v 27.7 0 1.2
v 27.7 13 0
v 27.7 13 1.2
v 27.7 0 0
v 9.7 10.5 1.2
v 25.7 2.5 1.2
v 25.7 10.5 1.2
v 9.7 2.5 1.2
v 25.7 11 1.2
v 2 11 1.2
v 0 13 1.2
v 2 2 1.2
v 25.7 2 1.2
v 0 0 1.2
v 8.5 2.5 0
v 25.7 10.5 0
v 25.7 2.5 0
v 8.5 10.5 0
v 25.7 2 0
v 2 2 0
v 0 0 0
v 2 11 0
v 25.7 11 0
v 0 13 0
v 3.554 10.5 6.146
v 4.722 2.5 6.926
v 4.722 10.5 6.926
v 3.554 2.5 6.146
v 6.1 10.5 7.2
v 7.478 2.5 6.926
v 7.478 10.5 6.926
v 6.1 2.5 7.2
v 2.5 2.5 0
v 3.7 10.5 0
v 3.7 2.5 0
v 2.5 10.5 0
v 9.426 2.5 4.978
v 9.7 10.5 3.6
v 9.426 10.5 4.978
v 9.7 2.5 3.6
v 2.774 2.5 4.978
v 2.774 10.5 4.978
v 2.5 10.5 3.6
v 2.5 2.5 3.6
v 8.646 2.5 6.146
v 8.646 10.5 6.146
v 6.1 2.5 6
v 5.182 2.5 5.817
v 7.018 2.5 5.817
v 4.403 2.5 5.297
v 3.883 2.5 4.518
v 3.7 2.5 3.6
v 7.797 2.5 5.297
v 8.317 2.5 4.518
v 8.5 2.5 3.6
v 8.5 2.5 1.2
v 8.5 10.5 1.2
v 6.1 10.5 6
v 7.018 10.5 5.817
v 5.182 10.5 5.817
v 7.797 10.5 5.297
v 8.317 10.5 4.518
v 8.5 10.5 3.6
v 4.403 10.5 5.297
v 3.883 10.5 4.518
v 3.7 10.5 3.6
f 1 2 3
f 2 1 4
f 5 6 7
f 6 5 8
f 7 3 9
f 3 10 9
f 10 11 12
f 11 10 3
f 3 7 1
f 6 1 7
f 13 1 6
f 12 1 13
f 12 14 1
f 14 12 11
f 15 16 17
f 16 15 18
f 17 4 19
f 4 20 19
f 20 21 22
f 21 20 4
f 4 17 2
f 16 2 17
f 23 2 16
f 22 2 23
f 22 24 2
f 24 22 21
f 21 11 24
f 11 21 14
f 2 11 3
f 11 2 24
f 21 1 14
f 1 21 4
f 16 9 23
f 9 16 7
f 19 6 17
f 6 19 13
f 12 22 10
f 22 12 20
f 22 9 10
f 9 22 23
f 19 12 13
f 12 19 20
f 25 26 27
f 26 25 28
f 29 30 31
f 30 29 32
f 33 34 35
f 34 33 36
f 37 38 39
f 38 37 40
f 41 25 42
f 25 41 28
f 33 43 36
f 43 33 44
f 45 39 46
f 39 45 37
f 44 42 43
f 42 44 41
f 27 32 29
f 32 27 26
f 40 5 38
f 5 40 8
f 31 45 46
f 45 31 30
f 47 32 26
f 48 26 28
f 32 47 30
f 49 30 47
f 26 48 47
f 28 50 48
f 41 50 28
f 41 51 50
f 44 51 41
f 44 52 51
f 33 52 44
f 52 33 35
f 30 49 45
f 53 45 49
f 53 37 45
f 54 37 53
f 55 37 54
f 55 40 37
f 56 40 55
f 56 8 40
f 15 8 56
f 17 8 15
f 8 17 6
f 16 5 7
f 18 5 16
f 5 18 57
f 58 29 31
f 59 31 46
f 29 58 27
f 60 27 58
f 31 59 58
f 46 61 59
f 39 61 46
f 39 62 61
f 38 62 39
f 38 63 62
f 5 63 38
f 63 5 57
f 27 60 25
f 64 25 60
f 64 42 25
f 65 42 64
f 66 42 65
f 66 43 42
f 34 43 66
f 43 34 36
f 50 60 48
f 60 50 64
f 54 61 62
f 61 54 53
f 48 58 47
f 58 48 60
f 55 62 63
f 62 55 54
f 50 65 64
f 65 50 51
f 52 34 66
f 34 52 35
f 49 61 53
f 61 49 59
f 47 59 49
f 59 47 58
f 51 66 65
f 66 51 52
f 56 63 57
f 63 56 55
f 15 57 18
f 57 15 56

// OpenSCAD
//Parameters
//Diameter of cable (mm)
cablediam = 4.8;
//Length label (part right of the cable without edge, mm) 
lablength = 16;
//Width label (without edge, mm)
labwidth = 8;  
//Overall thicknes of the part (mm)
thickness = 1.2;  
//Text on label (use spaces for aligning)
labeltext = "";  
//Font, correct spelled and with capitals
textfont = "Arial Black"; 
//Text appearance, 0=raised, 1=sunk, 2 = hole 
textappear=0;   


//Modules

module rim()
{
  difference()
  {
    cube([lo,wo,th]);
    translate([wr,wr,-0.5*th])
      cube([li+sp,wi+sp*2, th*2]);
  }
}

module labelplate()
{
  translate([wr+sp+cd+th, wr+sp,0])
    cube([li-cd-th,wi, th]);  
}  

module labeltext()
{
  translate([wr+sp+cd+th*3, wr+sp+wi*(1-sf)/2,0])
    linear_extrude(height = th*1.5)
      text(labeltext, size = wi*sf, font = textfont);
}  

module chull(cdh,wih,tcb)
{
  hull()  
  {
    translate([0,0,-tcb])
      cube([cdh, wih,cdh/2]);   
    translate([cdh/2,wih/2,cdh/2])
      rotate([90,0,0])  
        cylinder(d=cdh, wih, center=true); 
  }
}  

module cablehull()
{
  translate([wr+sp,wr+sp,0])
    difference()
    {
      chull(cd+th*2, wi,0);
      translate([th,-wi/2,th])
        chull(cd,wi*2, th*2);
    }  
}  



//main
//secondary parameters

sp = 0.5;          //space between label and outerrim
wi = labwidth;     //inner length
cd = cablediam;    //cable diameter
th = thickness;    //thickness plate
wr = wi/4;         //width outer rim
wo = labwidth + sp*2 + wr*2; //total width 
li = lablength + cd + th*2;  //inner length
lo = li + sp + wr*2;   //total length  
sf = 0.6;              //factor of wi for textsize
$fn=16;

rim();
if (textappear==0)
{
  labelplate();
  labeltext();
} 
else  
{
  difference()
  {
    labelplate();
    //-0.001 is irritating but for clean preview
    translate([0,0,(2-textappear)*th/2-0.001])  
      labeltext();
  } 
}  
cablehull();
